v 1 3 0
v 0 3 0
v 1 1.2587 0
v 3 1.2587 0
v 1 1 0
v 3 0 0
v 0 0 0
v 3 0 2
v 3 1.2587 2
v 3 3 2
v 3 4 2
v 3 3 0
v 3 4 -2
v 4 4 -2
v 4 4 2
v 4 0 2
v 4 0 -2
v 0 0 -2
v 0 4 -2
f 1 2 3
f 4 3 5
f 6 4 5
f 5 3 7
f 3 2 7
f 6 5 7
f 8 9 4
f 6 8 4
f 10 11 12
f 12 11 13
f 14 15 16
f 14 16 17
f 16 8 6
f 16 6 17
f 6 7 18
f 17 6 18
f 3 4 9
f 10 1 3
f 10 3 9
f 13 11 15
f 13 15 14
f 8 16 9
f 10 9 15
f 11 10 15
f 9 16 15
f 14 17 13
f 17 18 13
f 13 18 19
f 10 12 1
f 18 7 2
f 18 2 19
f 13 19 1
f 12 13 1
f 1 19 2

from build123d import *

# Parameters (mm, degrees)
BOSS_EXTRUDE1_DEPTH = 3
SKETCH2_W           = 4
SKETCH2_H           = 4
BOSS_EXTRUDE2_DEPTH = 1
SKETCH3_W           = 2
SKETCH3_H           = 1.741265719
BOSS_EXTRUDE3_DEPTH = 2
CUT_EXTRUDE1_DEPTH  = 2


with BuildPart() as part:
    # Sketch1 → Boss-Extrude1 (new body)
    with BuildSketch(Plane(origin=(0, 0, 0), x_dir=(0, 0, -1), z_dir=(1, 0, 0))):
        Polygon((0, 0), (2, 0), (2, 4), (0, 3), align=None)
    extrude(amount=BOSS_EXTRUDE1_DEPTH)

    # Sketch2 → Boss-Extrude2 (add)
    with BuildSketch(Plane(origin=(3, 0, 0), x_dir=(0, 0, -1), z_dir=(1, 0, 0))):
        with Locations((0, 2)):
            Rectangle(SKETCH2_W, SKETCH2_H)
    extrude(amount=BOSS_EXTRUDE2_DEPTH)

    # Sketch3 → Boss-Extrude3 (add)
    with BuildSketch(Plane.ZY.offset(-3)):
        with Locations((1, 2.129367141)):
            Rectangle(SKETCH3_W, SKETCH3_H)
    extrude(amount=BOSS_EXTRUDE3_DEPTH)

    # Sketch4 → Cut-Extrude1 (cut)
    with BuildSketch(Plane(origin=(0, 3, 0), x_dir=(1, 0, 0), z_dir=(0, 1, 0))):
        Polygon((1, 0), (3, -2), (1, -2), align=None)
    extrude(amount=-CUT_EXTRUDE1_DEPTH, mode=Mode.SUBTRACT)


solid = part.part
